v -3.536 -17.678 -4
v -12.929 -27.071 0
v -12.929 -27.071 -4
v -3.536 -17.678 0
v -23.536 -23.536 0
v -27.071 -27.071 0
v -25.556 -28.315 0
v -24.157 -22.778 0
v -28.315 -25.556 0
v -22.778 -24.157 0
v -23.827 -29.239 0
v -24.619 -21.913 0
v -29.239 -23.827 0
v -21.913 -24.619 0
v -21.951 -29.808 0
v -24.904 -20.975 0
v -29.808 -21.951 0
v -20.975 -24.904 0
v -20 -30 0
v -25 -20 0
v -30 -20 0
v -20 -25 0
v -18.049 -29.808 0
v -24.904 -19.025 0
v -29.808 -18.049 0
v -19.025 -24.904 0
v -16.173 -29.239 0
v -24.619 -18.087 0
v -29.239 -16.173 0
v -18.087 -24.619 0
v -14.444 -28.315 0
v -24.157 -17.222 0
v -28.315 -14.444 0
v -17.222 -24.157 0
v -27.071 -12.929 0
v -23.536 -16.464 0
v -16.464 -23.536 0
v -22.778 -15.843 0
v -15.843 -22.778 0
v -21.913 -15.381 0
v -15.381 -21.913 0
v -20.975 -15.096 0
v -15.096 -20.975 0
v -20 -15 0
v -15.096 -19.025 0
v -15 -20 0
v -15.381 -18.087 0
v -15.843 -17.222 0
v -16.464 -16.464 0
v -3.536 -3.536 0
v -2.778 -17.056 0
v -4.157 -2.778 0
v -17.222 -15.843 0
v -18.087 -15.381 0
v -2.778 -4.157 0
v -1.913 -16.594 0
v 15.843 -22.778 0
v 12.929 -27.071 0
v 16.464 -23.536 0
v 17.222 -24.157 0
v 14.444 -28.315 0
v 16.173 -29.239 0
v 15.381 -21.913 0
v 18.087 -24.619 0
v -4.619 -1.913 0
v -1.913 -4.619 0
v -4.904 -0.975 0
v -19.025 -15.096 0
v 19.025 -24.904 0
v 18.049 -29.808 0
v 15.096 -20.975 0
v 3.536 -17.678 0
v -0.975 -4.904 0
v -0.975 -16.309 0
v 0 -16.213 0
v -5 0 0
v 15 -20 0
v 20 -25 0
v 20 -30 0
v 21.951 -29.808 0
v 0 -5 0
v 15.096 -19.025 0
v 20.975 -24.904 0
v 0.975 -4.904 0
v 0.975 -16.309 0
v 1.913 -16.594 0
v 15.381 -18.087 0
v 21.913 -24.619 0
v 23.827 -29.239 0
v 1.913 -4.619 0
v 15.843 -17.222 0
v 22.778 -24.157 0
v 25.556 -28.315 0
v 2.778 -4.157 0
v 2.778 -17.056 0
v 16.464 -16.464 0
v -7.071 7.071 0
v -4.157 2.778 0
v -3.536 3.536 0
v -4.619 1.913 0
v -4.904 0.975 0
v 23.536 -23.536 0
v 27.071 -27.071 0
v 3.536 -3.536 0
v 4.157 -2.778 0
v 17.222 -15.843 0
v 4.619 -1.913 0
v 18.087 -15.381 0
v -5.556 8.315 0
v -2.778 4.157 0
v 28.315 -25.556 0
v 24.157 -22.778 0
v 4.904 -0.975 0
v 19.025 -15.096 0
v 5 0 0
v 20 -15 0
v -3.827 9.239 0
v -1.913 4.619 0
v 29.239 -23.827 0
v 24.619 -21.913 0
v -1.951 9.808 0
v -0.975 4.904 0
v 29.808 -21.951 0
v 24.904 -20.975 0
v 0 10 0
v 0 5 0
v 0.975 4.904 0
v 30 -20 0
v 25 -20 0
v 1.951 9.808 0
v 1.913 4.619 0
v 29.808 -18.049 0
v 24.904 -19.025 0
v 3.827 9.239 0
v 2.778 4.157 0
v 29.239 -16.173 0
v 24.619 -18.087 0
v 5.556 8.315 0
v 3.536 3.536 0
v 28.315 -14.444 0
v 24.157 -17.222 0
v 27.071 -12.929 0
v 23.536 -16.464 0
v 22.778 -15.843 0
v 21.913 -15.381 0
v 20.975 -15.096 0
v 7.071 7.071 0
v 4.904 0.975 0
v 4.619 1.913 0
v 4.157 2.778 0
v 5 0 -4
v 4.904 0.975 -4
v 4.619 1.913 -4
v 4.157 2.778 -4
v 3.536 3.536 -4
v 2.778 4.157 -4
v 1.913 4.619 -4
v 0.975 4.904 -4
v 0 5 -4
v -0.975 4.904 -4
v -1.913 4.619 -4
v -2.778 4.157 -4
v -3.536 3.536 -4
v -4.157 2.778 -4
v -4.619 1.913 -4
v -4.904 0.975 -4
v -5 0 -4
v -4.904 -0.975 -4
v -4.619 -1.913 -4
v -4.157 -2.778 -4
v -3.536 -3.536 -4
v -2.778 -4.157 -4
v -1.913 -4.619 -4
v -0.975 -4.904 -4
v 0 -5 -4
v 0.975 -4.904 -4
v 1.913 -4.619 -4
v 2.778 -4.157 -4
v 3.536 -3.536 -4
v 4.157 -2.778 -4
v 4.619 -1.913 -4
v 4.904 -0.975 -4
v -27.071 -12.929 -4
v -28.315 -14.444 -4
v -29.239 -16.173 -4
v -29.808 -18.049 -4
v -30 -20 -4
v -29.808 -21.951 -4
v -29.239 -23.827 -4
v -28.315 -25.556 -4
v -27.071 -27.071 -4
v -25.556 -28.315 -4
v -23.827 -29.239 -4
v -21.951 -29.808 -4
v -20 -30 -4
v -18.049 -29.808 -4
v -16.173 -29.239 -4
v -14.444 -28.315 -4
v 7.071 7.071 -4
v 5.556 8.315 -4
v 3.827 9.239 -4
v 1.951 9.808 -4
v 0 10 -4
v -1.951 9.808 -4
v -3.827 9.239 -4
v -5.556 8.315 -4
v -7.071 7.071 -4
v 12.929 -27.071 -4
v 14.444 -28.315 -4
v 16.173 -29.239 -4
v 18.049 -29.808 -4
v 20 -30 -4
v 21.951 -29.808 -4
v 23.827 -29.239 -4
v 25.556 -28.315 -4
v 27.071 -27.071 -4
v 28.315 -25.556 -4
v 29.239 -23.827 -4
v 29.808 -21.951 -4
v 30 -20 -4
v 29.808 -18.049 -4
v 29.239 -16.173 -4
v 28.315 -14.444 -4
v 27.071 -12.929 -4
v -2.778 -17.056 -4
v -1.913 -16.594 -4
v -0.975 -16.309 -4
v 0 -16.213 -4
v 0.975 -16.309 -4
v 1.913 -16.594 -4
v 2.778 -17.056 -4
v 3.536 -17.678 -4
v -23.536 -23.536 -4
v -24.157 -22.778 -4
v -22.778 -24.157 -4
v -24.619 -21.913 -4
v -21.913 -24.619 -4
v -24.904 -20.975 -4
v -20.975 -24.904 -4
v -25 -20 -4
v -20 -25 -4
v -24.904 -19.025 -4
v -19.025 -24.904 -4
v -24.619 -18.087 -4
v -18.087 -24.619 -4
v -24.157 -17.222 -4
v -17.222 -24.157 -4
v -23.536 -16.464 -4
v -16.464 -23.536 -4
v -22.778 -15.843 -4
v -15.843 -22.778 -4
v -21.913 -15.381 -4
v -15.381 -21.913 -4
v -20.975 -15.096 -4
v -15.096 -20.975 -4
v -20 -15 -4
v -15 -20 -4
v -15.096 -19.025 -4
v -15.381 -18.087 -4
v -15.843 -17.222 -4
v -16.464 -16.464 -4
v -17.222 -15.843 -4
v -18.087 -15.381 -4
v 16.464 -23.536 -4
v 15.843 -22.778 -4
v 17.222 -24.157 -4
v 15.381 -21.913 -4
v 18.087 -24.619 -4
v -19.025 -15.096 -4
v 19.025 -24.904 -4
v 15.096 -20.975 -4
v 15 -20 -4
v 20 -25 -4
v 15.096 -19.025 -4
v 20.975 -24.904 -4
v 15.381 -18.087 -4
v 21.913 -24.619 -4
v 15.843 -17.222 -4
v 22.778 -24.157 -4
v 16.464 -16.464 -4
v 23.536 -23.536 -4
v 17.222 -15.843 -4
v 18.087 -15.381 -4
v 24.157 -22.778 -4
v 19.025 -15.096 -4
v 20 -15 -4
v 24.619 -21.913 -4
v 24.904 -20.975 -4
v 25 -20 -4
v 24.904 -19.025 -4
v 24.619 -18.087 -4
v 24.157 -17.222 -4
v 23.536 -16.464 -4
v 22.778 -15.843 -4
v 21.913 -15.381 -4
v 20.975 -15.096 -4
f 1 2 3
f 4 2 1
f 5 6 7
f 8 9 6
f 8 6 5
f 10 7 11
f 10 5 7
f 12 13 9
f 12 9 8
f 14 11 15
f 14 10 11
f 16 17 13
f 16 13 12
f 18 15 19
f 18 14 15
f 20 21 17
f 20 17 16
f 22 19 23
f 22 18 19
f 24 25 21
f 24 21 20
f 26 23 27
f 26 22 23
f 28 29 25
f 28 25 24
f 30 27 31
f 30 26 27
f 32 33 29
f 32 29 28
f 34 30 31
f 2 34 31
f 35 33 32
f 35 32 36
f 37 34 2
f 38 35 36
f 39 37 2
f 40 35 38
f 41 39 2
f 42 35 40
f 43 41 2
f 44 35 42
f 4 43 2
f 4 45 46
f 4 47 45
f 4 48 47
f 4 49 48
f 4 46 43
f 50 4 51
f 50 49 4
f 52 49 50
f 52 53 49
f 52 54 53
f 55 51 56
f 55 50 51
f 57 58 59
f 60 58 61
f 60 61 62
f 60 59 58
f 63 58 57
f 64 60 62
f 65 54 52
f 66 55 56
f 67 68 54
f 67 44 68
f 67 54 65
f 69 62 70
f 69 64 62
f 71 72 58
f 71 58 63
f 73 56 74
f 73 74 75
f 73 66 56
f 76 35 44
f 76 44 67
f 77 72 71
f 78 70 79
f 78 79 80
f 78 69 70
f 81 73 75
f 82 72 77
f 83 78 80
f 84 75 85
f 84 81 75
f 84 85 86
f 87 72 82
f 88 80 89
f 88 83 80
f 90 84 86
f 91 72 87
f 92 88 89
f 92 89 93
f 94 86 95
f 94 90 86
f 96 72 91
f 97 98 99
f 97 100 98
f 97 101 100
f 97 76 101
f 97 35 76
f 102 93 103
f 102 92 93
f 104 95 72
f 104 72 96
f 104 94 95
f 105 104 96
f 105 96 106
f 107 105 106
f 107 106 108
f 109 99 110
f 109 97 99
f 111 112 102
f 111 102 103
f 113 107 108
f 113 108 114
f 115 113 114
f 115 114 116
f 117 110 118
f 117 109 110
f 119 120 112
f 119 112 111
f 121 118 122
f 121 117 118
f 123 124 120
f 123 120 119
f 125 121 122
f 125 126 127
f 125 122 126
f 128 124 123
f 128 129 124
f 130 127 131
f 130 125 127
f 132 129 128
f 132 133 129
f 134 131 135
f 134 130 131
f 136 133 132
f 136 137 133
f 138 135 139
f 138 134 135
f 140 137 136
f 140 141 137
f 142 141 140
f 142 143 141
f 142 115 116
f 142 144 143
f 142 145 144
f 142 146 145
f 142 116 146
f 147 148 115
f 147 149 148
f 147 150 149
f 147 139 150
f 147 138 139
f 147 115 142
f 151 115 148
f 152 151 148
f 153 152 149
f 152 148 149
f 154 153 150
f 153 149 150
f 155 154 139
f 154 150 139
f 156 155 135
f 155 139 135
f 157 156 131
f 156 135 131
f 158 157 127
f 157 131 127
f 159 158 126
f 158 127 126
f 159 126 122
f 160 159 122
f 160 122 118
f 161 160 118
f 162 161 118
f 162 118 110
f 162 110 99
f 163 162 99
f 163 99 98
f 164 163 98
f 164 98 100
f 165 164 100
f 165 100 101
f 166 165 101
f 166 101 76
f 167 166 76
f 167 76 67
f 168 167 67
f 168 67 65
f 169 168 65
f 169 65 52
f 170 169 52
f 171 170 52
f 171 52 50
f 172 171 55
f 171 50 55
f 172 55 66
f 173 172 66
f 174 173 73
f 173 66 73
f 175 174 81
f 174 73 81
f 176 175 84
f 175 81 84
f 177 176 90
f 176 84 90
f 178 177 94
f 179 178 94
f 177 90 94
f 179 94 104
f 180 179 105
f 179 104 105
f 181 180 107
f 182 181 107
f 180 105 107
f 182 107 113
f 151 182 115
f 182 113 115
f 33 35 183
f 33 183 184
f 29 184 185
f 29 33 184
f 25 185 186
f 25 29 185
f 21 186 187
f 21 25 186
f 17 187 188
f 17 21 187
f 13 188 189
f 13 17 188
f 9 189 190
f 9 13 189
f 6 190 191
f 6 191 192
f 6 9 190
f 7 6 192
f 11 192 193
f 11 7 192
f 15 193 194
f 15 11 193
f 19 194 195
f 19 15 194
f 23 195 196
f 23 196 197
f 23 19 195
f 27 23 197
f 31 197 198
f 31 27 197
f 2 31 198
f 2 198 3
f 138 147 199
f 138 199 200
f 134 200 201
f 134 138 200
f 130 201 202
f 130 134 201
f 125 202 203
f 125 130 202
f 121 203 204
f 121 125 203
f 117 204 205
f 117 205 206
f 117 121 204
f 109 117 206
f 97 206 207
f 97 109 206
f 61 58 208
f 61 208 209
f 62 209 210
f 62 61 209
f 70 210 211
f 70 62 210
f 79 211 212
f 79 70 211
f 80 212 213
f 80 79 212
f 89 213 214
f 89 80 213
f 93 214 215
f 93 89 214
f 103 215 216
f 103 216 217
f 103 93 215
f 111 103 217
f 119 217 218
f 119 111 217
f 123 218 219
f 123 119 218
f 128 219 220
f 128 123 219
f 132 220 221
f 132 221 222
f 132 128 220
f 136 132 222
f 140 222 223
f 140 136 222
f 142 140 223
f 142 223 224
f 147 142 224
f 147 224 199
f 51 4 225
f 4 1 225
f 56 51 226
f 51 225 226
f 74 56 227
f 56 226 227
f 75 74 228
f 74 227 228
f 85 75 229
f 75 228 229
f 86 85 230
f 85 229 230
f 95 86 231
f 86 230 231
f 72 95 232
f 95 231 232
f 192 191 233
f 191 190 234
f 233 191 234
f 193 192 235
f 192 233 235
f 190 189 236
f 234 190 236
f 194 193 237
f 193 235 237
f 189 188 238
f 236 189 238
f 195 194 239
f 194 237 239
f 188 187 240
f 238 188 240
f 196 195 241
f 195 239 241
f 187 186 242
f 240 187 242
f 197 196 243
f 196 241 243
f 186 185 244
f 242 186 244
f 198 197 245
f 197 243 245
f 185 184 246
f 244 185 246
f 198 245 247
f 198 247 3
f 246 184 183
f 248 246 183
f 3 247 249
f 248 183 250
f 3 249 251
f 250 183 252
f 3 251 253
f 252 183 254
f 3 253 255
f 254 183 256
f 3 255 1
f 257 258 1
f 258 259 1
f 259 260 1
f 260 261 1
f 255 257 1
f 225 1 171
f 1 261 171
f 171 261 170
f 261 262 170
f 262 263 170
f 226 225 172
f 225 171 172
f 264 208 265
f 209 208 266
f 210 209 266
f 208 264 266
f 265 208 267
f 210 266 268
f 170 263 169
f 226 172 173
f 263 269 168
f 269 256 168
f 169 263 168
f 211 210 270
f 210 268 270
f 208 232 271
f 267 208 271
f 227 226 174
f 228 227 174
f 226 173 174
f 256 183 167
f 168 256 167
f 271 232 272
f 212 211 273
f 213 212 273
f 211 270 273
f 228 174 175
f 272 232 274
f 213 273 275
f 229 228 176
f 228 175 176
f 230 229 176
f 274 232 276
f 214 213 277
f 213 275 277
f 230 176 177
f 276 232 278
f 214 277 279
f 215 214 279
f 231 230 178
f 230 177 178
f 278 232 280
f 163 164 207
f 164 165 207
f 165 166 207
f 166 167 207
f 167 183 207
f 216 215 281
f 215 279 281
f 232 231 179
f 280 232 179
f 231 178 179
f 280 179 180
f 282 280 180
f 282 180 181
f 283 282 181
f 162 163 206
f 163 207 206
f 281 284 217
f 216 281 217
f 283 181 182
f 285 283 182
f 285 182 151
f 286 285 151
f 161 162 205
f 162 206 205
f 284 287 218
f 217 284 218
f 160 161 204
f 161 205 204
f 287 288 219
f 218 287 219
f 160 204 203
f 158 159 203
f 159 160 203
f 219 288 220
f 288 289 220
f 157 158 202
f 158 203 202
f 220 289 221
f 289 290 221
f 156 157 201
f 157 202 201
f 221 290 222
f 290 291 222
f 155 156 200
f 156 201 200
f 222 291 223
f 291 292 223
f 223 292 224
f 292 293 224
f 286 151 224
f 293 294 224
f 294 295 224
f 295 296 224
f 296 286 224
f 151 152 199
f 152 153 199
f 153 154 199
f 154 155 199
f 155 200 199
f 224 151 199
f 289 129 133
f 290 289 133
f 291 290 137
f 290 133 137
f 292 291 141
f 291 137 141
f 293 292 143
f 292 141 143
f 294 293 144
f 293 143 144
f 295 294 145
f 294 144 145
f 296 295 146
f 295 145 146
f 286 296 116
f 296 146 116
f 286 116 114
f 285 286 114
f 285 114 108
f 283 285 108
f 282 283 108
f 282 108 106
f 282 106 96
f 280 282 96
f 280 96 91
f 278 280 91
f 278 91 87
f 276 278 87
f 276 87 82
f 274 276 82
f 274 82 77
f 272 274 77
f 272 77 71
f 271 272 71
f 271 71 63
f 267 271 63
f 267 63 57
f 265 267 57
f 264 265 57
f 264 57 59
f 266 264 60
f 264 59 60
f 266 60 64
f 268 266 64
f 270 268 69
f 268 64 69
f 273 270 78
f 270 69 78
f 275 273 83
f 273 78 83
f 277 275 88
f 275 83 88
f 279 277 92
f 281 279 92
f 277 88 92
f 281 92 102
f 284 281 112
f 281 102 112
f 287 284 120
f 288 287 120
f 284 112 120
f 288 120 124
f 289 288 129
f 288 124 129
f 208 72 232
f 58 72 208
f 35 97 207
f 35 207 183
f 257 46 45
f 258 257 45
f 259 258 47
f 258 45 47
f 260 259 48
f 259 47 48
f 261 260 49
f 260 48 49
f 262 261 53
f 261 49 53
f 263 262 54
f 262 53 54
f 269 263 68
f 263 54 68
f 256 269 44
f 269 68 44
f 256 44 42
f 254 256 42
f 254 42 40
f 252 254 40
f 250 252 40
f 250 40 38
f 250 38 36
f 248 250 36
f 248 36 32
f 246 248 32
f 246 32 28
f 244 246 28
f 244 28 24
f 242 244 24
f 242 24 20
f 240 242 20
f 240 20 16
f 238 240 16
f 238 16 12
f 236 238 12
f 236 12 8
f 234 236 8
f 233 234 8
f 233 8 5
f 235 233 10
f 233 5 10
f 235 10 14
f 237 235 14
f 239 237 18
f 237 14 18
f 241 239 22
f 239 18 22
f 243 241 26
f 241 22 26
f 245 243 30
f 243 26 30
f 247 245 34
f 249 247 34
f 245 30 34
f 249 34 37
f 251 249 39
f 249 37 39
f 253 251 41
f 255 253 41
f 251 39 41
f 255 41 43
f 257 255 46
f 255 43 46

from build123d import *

# Parameters (mm, degrees)
SM_BASE_FLANGE_1_DEPTH = 4
SKETCH_6_R             = 5
CUT_EXTRUDE_1_DEPTH    = 10
FILLET_1_R             = 5


# Sheet-metal steps are written as plain solids
with BuildPart() as part:
    # Sketch 1 → 基体-法兰1 (new body)
    with BuildSketch(Plane.XY):
        with BuildLine():
            Line((-7.071067812, 7.071067812), (-27.071067812, -12.928932188))
            ThreePointArc((-27.071067812, -12.928932188), (-27.071067812, -27.071067812), (-12.928932188, -27.071067812))
            Line((-12.928932188, -27.071067812), (0, -14.142135624))
            Line((0, -14.142135624), (12.928932188, -27.071067812))
            ThreePointArc((12.928932188, -27.071067812), (27.071067812, -27.071067812), (27.071067812, -12.928932188))
            Line((27.071067812, -12.928932188), (7.071067812, 7.071067812))
            ThreePointArc((7.071067812, 7.071067812), (0, 10), (-7.071067812, 7.071067812))
        make_face()
    extrude(amount=-SM_BASE_FLANGE_1_DEPTH)

    # 草图6 → 切除-拉伸1 (cut)
    with BuildSketch(Plane.XY):
        Circle(SKETCH_6_R)
        with Locations((-20, -20)):
            Circle(SKETCH_6_R)
        with Locations((20, -20)):
            Circle(SKETCH_6_R)
    extrude(amount=-CUT_EXTRUDE_1_DEPTH, mode=Mode.SUBTRACT)

    # 圆角1
    fillet_1_edges = [part.edges().sort_by_distance(p)[0] for p in [
        (0, -14.142135624, -2),
    ]]
    fillet(fillet_1_edges, radius=FILLET_1_R)


solid = part.part
